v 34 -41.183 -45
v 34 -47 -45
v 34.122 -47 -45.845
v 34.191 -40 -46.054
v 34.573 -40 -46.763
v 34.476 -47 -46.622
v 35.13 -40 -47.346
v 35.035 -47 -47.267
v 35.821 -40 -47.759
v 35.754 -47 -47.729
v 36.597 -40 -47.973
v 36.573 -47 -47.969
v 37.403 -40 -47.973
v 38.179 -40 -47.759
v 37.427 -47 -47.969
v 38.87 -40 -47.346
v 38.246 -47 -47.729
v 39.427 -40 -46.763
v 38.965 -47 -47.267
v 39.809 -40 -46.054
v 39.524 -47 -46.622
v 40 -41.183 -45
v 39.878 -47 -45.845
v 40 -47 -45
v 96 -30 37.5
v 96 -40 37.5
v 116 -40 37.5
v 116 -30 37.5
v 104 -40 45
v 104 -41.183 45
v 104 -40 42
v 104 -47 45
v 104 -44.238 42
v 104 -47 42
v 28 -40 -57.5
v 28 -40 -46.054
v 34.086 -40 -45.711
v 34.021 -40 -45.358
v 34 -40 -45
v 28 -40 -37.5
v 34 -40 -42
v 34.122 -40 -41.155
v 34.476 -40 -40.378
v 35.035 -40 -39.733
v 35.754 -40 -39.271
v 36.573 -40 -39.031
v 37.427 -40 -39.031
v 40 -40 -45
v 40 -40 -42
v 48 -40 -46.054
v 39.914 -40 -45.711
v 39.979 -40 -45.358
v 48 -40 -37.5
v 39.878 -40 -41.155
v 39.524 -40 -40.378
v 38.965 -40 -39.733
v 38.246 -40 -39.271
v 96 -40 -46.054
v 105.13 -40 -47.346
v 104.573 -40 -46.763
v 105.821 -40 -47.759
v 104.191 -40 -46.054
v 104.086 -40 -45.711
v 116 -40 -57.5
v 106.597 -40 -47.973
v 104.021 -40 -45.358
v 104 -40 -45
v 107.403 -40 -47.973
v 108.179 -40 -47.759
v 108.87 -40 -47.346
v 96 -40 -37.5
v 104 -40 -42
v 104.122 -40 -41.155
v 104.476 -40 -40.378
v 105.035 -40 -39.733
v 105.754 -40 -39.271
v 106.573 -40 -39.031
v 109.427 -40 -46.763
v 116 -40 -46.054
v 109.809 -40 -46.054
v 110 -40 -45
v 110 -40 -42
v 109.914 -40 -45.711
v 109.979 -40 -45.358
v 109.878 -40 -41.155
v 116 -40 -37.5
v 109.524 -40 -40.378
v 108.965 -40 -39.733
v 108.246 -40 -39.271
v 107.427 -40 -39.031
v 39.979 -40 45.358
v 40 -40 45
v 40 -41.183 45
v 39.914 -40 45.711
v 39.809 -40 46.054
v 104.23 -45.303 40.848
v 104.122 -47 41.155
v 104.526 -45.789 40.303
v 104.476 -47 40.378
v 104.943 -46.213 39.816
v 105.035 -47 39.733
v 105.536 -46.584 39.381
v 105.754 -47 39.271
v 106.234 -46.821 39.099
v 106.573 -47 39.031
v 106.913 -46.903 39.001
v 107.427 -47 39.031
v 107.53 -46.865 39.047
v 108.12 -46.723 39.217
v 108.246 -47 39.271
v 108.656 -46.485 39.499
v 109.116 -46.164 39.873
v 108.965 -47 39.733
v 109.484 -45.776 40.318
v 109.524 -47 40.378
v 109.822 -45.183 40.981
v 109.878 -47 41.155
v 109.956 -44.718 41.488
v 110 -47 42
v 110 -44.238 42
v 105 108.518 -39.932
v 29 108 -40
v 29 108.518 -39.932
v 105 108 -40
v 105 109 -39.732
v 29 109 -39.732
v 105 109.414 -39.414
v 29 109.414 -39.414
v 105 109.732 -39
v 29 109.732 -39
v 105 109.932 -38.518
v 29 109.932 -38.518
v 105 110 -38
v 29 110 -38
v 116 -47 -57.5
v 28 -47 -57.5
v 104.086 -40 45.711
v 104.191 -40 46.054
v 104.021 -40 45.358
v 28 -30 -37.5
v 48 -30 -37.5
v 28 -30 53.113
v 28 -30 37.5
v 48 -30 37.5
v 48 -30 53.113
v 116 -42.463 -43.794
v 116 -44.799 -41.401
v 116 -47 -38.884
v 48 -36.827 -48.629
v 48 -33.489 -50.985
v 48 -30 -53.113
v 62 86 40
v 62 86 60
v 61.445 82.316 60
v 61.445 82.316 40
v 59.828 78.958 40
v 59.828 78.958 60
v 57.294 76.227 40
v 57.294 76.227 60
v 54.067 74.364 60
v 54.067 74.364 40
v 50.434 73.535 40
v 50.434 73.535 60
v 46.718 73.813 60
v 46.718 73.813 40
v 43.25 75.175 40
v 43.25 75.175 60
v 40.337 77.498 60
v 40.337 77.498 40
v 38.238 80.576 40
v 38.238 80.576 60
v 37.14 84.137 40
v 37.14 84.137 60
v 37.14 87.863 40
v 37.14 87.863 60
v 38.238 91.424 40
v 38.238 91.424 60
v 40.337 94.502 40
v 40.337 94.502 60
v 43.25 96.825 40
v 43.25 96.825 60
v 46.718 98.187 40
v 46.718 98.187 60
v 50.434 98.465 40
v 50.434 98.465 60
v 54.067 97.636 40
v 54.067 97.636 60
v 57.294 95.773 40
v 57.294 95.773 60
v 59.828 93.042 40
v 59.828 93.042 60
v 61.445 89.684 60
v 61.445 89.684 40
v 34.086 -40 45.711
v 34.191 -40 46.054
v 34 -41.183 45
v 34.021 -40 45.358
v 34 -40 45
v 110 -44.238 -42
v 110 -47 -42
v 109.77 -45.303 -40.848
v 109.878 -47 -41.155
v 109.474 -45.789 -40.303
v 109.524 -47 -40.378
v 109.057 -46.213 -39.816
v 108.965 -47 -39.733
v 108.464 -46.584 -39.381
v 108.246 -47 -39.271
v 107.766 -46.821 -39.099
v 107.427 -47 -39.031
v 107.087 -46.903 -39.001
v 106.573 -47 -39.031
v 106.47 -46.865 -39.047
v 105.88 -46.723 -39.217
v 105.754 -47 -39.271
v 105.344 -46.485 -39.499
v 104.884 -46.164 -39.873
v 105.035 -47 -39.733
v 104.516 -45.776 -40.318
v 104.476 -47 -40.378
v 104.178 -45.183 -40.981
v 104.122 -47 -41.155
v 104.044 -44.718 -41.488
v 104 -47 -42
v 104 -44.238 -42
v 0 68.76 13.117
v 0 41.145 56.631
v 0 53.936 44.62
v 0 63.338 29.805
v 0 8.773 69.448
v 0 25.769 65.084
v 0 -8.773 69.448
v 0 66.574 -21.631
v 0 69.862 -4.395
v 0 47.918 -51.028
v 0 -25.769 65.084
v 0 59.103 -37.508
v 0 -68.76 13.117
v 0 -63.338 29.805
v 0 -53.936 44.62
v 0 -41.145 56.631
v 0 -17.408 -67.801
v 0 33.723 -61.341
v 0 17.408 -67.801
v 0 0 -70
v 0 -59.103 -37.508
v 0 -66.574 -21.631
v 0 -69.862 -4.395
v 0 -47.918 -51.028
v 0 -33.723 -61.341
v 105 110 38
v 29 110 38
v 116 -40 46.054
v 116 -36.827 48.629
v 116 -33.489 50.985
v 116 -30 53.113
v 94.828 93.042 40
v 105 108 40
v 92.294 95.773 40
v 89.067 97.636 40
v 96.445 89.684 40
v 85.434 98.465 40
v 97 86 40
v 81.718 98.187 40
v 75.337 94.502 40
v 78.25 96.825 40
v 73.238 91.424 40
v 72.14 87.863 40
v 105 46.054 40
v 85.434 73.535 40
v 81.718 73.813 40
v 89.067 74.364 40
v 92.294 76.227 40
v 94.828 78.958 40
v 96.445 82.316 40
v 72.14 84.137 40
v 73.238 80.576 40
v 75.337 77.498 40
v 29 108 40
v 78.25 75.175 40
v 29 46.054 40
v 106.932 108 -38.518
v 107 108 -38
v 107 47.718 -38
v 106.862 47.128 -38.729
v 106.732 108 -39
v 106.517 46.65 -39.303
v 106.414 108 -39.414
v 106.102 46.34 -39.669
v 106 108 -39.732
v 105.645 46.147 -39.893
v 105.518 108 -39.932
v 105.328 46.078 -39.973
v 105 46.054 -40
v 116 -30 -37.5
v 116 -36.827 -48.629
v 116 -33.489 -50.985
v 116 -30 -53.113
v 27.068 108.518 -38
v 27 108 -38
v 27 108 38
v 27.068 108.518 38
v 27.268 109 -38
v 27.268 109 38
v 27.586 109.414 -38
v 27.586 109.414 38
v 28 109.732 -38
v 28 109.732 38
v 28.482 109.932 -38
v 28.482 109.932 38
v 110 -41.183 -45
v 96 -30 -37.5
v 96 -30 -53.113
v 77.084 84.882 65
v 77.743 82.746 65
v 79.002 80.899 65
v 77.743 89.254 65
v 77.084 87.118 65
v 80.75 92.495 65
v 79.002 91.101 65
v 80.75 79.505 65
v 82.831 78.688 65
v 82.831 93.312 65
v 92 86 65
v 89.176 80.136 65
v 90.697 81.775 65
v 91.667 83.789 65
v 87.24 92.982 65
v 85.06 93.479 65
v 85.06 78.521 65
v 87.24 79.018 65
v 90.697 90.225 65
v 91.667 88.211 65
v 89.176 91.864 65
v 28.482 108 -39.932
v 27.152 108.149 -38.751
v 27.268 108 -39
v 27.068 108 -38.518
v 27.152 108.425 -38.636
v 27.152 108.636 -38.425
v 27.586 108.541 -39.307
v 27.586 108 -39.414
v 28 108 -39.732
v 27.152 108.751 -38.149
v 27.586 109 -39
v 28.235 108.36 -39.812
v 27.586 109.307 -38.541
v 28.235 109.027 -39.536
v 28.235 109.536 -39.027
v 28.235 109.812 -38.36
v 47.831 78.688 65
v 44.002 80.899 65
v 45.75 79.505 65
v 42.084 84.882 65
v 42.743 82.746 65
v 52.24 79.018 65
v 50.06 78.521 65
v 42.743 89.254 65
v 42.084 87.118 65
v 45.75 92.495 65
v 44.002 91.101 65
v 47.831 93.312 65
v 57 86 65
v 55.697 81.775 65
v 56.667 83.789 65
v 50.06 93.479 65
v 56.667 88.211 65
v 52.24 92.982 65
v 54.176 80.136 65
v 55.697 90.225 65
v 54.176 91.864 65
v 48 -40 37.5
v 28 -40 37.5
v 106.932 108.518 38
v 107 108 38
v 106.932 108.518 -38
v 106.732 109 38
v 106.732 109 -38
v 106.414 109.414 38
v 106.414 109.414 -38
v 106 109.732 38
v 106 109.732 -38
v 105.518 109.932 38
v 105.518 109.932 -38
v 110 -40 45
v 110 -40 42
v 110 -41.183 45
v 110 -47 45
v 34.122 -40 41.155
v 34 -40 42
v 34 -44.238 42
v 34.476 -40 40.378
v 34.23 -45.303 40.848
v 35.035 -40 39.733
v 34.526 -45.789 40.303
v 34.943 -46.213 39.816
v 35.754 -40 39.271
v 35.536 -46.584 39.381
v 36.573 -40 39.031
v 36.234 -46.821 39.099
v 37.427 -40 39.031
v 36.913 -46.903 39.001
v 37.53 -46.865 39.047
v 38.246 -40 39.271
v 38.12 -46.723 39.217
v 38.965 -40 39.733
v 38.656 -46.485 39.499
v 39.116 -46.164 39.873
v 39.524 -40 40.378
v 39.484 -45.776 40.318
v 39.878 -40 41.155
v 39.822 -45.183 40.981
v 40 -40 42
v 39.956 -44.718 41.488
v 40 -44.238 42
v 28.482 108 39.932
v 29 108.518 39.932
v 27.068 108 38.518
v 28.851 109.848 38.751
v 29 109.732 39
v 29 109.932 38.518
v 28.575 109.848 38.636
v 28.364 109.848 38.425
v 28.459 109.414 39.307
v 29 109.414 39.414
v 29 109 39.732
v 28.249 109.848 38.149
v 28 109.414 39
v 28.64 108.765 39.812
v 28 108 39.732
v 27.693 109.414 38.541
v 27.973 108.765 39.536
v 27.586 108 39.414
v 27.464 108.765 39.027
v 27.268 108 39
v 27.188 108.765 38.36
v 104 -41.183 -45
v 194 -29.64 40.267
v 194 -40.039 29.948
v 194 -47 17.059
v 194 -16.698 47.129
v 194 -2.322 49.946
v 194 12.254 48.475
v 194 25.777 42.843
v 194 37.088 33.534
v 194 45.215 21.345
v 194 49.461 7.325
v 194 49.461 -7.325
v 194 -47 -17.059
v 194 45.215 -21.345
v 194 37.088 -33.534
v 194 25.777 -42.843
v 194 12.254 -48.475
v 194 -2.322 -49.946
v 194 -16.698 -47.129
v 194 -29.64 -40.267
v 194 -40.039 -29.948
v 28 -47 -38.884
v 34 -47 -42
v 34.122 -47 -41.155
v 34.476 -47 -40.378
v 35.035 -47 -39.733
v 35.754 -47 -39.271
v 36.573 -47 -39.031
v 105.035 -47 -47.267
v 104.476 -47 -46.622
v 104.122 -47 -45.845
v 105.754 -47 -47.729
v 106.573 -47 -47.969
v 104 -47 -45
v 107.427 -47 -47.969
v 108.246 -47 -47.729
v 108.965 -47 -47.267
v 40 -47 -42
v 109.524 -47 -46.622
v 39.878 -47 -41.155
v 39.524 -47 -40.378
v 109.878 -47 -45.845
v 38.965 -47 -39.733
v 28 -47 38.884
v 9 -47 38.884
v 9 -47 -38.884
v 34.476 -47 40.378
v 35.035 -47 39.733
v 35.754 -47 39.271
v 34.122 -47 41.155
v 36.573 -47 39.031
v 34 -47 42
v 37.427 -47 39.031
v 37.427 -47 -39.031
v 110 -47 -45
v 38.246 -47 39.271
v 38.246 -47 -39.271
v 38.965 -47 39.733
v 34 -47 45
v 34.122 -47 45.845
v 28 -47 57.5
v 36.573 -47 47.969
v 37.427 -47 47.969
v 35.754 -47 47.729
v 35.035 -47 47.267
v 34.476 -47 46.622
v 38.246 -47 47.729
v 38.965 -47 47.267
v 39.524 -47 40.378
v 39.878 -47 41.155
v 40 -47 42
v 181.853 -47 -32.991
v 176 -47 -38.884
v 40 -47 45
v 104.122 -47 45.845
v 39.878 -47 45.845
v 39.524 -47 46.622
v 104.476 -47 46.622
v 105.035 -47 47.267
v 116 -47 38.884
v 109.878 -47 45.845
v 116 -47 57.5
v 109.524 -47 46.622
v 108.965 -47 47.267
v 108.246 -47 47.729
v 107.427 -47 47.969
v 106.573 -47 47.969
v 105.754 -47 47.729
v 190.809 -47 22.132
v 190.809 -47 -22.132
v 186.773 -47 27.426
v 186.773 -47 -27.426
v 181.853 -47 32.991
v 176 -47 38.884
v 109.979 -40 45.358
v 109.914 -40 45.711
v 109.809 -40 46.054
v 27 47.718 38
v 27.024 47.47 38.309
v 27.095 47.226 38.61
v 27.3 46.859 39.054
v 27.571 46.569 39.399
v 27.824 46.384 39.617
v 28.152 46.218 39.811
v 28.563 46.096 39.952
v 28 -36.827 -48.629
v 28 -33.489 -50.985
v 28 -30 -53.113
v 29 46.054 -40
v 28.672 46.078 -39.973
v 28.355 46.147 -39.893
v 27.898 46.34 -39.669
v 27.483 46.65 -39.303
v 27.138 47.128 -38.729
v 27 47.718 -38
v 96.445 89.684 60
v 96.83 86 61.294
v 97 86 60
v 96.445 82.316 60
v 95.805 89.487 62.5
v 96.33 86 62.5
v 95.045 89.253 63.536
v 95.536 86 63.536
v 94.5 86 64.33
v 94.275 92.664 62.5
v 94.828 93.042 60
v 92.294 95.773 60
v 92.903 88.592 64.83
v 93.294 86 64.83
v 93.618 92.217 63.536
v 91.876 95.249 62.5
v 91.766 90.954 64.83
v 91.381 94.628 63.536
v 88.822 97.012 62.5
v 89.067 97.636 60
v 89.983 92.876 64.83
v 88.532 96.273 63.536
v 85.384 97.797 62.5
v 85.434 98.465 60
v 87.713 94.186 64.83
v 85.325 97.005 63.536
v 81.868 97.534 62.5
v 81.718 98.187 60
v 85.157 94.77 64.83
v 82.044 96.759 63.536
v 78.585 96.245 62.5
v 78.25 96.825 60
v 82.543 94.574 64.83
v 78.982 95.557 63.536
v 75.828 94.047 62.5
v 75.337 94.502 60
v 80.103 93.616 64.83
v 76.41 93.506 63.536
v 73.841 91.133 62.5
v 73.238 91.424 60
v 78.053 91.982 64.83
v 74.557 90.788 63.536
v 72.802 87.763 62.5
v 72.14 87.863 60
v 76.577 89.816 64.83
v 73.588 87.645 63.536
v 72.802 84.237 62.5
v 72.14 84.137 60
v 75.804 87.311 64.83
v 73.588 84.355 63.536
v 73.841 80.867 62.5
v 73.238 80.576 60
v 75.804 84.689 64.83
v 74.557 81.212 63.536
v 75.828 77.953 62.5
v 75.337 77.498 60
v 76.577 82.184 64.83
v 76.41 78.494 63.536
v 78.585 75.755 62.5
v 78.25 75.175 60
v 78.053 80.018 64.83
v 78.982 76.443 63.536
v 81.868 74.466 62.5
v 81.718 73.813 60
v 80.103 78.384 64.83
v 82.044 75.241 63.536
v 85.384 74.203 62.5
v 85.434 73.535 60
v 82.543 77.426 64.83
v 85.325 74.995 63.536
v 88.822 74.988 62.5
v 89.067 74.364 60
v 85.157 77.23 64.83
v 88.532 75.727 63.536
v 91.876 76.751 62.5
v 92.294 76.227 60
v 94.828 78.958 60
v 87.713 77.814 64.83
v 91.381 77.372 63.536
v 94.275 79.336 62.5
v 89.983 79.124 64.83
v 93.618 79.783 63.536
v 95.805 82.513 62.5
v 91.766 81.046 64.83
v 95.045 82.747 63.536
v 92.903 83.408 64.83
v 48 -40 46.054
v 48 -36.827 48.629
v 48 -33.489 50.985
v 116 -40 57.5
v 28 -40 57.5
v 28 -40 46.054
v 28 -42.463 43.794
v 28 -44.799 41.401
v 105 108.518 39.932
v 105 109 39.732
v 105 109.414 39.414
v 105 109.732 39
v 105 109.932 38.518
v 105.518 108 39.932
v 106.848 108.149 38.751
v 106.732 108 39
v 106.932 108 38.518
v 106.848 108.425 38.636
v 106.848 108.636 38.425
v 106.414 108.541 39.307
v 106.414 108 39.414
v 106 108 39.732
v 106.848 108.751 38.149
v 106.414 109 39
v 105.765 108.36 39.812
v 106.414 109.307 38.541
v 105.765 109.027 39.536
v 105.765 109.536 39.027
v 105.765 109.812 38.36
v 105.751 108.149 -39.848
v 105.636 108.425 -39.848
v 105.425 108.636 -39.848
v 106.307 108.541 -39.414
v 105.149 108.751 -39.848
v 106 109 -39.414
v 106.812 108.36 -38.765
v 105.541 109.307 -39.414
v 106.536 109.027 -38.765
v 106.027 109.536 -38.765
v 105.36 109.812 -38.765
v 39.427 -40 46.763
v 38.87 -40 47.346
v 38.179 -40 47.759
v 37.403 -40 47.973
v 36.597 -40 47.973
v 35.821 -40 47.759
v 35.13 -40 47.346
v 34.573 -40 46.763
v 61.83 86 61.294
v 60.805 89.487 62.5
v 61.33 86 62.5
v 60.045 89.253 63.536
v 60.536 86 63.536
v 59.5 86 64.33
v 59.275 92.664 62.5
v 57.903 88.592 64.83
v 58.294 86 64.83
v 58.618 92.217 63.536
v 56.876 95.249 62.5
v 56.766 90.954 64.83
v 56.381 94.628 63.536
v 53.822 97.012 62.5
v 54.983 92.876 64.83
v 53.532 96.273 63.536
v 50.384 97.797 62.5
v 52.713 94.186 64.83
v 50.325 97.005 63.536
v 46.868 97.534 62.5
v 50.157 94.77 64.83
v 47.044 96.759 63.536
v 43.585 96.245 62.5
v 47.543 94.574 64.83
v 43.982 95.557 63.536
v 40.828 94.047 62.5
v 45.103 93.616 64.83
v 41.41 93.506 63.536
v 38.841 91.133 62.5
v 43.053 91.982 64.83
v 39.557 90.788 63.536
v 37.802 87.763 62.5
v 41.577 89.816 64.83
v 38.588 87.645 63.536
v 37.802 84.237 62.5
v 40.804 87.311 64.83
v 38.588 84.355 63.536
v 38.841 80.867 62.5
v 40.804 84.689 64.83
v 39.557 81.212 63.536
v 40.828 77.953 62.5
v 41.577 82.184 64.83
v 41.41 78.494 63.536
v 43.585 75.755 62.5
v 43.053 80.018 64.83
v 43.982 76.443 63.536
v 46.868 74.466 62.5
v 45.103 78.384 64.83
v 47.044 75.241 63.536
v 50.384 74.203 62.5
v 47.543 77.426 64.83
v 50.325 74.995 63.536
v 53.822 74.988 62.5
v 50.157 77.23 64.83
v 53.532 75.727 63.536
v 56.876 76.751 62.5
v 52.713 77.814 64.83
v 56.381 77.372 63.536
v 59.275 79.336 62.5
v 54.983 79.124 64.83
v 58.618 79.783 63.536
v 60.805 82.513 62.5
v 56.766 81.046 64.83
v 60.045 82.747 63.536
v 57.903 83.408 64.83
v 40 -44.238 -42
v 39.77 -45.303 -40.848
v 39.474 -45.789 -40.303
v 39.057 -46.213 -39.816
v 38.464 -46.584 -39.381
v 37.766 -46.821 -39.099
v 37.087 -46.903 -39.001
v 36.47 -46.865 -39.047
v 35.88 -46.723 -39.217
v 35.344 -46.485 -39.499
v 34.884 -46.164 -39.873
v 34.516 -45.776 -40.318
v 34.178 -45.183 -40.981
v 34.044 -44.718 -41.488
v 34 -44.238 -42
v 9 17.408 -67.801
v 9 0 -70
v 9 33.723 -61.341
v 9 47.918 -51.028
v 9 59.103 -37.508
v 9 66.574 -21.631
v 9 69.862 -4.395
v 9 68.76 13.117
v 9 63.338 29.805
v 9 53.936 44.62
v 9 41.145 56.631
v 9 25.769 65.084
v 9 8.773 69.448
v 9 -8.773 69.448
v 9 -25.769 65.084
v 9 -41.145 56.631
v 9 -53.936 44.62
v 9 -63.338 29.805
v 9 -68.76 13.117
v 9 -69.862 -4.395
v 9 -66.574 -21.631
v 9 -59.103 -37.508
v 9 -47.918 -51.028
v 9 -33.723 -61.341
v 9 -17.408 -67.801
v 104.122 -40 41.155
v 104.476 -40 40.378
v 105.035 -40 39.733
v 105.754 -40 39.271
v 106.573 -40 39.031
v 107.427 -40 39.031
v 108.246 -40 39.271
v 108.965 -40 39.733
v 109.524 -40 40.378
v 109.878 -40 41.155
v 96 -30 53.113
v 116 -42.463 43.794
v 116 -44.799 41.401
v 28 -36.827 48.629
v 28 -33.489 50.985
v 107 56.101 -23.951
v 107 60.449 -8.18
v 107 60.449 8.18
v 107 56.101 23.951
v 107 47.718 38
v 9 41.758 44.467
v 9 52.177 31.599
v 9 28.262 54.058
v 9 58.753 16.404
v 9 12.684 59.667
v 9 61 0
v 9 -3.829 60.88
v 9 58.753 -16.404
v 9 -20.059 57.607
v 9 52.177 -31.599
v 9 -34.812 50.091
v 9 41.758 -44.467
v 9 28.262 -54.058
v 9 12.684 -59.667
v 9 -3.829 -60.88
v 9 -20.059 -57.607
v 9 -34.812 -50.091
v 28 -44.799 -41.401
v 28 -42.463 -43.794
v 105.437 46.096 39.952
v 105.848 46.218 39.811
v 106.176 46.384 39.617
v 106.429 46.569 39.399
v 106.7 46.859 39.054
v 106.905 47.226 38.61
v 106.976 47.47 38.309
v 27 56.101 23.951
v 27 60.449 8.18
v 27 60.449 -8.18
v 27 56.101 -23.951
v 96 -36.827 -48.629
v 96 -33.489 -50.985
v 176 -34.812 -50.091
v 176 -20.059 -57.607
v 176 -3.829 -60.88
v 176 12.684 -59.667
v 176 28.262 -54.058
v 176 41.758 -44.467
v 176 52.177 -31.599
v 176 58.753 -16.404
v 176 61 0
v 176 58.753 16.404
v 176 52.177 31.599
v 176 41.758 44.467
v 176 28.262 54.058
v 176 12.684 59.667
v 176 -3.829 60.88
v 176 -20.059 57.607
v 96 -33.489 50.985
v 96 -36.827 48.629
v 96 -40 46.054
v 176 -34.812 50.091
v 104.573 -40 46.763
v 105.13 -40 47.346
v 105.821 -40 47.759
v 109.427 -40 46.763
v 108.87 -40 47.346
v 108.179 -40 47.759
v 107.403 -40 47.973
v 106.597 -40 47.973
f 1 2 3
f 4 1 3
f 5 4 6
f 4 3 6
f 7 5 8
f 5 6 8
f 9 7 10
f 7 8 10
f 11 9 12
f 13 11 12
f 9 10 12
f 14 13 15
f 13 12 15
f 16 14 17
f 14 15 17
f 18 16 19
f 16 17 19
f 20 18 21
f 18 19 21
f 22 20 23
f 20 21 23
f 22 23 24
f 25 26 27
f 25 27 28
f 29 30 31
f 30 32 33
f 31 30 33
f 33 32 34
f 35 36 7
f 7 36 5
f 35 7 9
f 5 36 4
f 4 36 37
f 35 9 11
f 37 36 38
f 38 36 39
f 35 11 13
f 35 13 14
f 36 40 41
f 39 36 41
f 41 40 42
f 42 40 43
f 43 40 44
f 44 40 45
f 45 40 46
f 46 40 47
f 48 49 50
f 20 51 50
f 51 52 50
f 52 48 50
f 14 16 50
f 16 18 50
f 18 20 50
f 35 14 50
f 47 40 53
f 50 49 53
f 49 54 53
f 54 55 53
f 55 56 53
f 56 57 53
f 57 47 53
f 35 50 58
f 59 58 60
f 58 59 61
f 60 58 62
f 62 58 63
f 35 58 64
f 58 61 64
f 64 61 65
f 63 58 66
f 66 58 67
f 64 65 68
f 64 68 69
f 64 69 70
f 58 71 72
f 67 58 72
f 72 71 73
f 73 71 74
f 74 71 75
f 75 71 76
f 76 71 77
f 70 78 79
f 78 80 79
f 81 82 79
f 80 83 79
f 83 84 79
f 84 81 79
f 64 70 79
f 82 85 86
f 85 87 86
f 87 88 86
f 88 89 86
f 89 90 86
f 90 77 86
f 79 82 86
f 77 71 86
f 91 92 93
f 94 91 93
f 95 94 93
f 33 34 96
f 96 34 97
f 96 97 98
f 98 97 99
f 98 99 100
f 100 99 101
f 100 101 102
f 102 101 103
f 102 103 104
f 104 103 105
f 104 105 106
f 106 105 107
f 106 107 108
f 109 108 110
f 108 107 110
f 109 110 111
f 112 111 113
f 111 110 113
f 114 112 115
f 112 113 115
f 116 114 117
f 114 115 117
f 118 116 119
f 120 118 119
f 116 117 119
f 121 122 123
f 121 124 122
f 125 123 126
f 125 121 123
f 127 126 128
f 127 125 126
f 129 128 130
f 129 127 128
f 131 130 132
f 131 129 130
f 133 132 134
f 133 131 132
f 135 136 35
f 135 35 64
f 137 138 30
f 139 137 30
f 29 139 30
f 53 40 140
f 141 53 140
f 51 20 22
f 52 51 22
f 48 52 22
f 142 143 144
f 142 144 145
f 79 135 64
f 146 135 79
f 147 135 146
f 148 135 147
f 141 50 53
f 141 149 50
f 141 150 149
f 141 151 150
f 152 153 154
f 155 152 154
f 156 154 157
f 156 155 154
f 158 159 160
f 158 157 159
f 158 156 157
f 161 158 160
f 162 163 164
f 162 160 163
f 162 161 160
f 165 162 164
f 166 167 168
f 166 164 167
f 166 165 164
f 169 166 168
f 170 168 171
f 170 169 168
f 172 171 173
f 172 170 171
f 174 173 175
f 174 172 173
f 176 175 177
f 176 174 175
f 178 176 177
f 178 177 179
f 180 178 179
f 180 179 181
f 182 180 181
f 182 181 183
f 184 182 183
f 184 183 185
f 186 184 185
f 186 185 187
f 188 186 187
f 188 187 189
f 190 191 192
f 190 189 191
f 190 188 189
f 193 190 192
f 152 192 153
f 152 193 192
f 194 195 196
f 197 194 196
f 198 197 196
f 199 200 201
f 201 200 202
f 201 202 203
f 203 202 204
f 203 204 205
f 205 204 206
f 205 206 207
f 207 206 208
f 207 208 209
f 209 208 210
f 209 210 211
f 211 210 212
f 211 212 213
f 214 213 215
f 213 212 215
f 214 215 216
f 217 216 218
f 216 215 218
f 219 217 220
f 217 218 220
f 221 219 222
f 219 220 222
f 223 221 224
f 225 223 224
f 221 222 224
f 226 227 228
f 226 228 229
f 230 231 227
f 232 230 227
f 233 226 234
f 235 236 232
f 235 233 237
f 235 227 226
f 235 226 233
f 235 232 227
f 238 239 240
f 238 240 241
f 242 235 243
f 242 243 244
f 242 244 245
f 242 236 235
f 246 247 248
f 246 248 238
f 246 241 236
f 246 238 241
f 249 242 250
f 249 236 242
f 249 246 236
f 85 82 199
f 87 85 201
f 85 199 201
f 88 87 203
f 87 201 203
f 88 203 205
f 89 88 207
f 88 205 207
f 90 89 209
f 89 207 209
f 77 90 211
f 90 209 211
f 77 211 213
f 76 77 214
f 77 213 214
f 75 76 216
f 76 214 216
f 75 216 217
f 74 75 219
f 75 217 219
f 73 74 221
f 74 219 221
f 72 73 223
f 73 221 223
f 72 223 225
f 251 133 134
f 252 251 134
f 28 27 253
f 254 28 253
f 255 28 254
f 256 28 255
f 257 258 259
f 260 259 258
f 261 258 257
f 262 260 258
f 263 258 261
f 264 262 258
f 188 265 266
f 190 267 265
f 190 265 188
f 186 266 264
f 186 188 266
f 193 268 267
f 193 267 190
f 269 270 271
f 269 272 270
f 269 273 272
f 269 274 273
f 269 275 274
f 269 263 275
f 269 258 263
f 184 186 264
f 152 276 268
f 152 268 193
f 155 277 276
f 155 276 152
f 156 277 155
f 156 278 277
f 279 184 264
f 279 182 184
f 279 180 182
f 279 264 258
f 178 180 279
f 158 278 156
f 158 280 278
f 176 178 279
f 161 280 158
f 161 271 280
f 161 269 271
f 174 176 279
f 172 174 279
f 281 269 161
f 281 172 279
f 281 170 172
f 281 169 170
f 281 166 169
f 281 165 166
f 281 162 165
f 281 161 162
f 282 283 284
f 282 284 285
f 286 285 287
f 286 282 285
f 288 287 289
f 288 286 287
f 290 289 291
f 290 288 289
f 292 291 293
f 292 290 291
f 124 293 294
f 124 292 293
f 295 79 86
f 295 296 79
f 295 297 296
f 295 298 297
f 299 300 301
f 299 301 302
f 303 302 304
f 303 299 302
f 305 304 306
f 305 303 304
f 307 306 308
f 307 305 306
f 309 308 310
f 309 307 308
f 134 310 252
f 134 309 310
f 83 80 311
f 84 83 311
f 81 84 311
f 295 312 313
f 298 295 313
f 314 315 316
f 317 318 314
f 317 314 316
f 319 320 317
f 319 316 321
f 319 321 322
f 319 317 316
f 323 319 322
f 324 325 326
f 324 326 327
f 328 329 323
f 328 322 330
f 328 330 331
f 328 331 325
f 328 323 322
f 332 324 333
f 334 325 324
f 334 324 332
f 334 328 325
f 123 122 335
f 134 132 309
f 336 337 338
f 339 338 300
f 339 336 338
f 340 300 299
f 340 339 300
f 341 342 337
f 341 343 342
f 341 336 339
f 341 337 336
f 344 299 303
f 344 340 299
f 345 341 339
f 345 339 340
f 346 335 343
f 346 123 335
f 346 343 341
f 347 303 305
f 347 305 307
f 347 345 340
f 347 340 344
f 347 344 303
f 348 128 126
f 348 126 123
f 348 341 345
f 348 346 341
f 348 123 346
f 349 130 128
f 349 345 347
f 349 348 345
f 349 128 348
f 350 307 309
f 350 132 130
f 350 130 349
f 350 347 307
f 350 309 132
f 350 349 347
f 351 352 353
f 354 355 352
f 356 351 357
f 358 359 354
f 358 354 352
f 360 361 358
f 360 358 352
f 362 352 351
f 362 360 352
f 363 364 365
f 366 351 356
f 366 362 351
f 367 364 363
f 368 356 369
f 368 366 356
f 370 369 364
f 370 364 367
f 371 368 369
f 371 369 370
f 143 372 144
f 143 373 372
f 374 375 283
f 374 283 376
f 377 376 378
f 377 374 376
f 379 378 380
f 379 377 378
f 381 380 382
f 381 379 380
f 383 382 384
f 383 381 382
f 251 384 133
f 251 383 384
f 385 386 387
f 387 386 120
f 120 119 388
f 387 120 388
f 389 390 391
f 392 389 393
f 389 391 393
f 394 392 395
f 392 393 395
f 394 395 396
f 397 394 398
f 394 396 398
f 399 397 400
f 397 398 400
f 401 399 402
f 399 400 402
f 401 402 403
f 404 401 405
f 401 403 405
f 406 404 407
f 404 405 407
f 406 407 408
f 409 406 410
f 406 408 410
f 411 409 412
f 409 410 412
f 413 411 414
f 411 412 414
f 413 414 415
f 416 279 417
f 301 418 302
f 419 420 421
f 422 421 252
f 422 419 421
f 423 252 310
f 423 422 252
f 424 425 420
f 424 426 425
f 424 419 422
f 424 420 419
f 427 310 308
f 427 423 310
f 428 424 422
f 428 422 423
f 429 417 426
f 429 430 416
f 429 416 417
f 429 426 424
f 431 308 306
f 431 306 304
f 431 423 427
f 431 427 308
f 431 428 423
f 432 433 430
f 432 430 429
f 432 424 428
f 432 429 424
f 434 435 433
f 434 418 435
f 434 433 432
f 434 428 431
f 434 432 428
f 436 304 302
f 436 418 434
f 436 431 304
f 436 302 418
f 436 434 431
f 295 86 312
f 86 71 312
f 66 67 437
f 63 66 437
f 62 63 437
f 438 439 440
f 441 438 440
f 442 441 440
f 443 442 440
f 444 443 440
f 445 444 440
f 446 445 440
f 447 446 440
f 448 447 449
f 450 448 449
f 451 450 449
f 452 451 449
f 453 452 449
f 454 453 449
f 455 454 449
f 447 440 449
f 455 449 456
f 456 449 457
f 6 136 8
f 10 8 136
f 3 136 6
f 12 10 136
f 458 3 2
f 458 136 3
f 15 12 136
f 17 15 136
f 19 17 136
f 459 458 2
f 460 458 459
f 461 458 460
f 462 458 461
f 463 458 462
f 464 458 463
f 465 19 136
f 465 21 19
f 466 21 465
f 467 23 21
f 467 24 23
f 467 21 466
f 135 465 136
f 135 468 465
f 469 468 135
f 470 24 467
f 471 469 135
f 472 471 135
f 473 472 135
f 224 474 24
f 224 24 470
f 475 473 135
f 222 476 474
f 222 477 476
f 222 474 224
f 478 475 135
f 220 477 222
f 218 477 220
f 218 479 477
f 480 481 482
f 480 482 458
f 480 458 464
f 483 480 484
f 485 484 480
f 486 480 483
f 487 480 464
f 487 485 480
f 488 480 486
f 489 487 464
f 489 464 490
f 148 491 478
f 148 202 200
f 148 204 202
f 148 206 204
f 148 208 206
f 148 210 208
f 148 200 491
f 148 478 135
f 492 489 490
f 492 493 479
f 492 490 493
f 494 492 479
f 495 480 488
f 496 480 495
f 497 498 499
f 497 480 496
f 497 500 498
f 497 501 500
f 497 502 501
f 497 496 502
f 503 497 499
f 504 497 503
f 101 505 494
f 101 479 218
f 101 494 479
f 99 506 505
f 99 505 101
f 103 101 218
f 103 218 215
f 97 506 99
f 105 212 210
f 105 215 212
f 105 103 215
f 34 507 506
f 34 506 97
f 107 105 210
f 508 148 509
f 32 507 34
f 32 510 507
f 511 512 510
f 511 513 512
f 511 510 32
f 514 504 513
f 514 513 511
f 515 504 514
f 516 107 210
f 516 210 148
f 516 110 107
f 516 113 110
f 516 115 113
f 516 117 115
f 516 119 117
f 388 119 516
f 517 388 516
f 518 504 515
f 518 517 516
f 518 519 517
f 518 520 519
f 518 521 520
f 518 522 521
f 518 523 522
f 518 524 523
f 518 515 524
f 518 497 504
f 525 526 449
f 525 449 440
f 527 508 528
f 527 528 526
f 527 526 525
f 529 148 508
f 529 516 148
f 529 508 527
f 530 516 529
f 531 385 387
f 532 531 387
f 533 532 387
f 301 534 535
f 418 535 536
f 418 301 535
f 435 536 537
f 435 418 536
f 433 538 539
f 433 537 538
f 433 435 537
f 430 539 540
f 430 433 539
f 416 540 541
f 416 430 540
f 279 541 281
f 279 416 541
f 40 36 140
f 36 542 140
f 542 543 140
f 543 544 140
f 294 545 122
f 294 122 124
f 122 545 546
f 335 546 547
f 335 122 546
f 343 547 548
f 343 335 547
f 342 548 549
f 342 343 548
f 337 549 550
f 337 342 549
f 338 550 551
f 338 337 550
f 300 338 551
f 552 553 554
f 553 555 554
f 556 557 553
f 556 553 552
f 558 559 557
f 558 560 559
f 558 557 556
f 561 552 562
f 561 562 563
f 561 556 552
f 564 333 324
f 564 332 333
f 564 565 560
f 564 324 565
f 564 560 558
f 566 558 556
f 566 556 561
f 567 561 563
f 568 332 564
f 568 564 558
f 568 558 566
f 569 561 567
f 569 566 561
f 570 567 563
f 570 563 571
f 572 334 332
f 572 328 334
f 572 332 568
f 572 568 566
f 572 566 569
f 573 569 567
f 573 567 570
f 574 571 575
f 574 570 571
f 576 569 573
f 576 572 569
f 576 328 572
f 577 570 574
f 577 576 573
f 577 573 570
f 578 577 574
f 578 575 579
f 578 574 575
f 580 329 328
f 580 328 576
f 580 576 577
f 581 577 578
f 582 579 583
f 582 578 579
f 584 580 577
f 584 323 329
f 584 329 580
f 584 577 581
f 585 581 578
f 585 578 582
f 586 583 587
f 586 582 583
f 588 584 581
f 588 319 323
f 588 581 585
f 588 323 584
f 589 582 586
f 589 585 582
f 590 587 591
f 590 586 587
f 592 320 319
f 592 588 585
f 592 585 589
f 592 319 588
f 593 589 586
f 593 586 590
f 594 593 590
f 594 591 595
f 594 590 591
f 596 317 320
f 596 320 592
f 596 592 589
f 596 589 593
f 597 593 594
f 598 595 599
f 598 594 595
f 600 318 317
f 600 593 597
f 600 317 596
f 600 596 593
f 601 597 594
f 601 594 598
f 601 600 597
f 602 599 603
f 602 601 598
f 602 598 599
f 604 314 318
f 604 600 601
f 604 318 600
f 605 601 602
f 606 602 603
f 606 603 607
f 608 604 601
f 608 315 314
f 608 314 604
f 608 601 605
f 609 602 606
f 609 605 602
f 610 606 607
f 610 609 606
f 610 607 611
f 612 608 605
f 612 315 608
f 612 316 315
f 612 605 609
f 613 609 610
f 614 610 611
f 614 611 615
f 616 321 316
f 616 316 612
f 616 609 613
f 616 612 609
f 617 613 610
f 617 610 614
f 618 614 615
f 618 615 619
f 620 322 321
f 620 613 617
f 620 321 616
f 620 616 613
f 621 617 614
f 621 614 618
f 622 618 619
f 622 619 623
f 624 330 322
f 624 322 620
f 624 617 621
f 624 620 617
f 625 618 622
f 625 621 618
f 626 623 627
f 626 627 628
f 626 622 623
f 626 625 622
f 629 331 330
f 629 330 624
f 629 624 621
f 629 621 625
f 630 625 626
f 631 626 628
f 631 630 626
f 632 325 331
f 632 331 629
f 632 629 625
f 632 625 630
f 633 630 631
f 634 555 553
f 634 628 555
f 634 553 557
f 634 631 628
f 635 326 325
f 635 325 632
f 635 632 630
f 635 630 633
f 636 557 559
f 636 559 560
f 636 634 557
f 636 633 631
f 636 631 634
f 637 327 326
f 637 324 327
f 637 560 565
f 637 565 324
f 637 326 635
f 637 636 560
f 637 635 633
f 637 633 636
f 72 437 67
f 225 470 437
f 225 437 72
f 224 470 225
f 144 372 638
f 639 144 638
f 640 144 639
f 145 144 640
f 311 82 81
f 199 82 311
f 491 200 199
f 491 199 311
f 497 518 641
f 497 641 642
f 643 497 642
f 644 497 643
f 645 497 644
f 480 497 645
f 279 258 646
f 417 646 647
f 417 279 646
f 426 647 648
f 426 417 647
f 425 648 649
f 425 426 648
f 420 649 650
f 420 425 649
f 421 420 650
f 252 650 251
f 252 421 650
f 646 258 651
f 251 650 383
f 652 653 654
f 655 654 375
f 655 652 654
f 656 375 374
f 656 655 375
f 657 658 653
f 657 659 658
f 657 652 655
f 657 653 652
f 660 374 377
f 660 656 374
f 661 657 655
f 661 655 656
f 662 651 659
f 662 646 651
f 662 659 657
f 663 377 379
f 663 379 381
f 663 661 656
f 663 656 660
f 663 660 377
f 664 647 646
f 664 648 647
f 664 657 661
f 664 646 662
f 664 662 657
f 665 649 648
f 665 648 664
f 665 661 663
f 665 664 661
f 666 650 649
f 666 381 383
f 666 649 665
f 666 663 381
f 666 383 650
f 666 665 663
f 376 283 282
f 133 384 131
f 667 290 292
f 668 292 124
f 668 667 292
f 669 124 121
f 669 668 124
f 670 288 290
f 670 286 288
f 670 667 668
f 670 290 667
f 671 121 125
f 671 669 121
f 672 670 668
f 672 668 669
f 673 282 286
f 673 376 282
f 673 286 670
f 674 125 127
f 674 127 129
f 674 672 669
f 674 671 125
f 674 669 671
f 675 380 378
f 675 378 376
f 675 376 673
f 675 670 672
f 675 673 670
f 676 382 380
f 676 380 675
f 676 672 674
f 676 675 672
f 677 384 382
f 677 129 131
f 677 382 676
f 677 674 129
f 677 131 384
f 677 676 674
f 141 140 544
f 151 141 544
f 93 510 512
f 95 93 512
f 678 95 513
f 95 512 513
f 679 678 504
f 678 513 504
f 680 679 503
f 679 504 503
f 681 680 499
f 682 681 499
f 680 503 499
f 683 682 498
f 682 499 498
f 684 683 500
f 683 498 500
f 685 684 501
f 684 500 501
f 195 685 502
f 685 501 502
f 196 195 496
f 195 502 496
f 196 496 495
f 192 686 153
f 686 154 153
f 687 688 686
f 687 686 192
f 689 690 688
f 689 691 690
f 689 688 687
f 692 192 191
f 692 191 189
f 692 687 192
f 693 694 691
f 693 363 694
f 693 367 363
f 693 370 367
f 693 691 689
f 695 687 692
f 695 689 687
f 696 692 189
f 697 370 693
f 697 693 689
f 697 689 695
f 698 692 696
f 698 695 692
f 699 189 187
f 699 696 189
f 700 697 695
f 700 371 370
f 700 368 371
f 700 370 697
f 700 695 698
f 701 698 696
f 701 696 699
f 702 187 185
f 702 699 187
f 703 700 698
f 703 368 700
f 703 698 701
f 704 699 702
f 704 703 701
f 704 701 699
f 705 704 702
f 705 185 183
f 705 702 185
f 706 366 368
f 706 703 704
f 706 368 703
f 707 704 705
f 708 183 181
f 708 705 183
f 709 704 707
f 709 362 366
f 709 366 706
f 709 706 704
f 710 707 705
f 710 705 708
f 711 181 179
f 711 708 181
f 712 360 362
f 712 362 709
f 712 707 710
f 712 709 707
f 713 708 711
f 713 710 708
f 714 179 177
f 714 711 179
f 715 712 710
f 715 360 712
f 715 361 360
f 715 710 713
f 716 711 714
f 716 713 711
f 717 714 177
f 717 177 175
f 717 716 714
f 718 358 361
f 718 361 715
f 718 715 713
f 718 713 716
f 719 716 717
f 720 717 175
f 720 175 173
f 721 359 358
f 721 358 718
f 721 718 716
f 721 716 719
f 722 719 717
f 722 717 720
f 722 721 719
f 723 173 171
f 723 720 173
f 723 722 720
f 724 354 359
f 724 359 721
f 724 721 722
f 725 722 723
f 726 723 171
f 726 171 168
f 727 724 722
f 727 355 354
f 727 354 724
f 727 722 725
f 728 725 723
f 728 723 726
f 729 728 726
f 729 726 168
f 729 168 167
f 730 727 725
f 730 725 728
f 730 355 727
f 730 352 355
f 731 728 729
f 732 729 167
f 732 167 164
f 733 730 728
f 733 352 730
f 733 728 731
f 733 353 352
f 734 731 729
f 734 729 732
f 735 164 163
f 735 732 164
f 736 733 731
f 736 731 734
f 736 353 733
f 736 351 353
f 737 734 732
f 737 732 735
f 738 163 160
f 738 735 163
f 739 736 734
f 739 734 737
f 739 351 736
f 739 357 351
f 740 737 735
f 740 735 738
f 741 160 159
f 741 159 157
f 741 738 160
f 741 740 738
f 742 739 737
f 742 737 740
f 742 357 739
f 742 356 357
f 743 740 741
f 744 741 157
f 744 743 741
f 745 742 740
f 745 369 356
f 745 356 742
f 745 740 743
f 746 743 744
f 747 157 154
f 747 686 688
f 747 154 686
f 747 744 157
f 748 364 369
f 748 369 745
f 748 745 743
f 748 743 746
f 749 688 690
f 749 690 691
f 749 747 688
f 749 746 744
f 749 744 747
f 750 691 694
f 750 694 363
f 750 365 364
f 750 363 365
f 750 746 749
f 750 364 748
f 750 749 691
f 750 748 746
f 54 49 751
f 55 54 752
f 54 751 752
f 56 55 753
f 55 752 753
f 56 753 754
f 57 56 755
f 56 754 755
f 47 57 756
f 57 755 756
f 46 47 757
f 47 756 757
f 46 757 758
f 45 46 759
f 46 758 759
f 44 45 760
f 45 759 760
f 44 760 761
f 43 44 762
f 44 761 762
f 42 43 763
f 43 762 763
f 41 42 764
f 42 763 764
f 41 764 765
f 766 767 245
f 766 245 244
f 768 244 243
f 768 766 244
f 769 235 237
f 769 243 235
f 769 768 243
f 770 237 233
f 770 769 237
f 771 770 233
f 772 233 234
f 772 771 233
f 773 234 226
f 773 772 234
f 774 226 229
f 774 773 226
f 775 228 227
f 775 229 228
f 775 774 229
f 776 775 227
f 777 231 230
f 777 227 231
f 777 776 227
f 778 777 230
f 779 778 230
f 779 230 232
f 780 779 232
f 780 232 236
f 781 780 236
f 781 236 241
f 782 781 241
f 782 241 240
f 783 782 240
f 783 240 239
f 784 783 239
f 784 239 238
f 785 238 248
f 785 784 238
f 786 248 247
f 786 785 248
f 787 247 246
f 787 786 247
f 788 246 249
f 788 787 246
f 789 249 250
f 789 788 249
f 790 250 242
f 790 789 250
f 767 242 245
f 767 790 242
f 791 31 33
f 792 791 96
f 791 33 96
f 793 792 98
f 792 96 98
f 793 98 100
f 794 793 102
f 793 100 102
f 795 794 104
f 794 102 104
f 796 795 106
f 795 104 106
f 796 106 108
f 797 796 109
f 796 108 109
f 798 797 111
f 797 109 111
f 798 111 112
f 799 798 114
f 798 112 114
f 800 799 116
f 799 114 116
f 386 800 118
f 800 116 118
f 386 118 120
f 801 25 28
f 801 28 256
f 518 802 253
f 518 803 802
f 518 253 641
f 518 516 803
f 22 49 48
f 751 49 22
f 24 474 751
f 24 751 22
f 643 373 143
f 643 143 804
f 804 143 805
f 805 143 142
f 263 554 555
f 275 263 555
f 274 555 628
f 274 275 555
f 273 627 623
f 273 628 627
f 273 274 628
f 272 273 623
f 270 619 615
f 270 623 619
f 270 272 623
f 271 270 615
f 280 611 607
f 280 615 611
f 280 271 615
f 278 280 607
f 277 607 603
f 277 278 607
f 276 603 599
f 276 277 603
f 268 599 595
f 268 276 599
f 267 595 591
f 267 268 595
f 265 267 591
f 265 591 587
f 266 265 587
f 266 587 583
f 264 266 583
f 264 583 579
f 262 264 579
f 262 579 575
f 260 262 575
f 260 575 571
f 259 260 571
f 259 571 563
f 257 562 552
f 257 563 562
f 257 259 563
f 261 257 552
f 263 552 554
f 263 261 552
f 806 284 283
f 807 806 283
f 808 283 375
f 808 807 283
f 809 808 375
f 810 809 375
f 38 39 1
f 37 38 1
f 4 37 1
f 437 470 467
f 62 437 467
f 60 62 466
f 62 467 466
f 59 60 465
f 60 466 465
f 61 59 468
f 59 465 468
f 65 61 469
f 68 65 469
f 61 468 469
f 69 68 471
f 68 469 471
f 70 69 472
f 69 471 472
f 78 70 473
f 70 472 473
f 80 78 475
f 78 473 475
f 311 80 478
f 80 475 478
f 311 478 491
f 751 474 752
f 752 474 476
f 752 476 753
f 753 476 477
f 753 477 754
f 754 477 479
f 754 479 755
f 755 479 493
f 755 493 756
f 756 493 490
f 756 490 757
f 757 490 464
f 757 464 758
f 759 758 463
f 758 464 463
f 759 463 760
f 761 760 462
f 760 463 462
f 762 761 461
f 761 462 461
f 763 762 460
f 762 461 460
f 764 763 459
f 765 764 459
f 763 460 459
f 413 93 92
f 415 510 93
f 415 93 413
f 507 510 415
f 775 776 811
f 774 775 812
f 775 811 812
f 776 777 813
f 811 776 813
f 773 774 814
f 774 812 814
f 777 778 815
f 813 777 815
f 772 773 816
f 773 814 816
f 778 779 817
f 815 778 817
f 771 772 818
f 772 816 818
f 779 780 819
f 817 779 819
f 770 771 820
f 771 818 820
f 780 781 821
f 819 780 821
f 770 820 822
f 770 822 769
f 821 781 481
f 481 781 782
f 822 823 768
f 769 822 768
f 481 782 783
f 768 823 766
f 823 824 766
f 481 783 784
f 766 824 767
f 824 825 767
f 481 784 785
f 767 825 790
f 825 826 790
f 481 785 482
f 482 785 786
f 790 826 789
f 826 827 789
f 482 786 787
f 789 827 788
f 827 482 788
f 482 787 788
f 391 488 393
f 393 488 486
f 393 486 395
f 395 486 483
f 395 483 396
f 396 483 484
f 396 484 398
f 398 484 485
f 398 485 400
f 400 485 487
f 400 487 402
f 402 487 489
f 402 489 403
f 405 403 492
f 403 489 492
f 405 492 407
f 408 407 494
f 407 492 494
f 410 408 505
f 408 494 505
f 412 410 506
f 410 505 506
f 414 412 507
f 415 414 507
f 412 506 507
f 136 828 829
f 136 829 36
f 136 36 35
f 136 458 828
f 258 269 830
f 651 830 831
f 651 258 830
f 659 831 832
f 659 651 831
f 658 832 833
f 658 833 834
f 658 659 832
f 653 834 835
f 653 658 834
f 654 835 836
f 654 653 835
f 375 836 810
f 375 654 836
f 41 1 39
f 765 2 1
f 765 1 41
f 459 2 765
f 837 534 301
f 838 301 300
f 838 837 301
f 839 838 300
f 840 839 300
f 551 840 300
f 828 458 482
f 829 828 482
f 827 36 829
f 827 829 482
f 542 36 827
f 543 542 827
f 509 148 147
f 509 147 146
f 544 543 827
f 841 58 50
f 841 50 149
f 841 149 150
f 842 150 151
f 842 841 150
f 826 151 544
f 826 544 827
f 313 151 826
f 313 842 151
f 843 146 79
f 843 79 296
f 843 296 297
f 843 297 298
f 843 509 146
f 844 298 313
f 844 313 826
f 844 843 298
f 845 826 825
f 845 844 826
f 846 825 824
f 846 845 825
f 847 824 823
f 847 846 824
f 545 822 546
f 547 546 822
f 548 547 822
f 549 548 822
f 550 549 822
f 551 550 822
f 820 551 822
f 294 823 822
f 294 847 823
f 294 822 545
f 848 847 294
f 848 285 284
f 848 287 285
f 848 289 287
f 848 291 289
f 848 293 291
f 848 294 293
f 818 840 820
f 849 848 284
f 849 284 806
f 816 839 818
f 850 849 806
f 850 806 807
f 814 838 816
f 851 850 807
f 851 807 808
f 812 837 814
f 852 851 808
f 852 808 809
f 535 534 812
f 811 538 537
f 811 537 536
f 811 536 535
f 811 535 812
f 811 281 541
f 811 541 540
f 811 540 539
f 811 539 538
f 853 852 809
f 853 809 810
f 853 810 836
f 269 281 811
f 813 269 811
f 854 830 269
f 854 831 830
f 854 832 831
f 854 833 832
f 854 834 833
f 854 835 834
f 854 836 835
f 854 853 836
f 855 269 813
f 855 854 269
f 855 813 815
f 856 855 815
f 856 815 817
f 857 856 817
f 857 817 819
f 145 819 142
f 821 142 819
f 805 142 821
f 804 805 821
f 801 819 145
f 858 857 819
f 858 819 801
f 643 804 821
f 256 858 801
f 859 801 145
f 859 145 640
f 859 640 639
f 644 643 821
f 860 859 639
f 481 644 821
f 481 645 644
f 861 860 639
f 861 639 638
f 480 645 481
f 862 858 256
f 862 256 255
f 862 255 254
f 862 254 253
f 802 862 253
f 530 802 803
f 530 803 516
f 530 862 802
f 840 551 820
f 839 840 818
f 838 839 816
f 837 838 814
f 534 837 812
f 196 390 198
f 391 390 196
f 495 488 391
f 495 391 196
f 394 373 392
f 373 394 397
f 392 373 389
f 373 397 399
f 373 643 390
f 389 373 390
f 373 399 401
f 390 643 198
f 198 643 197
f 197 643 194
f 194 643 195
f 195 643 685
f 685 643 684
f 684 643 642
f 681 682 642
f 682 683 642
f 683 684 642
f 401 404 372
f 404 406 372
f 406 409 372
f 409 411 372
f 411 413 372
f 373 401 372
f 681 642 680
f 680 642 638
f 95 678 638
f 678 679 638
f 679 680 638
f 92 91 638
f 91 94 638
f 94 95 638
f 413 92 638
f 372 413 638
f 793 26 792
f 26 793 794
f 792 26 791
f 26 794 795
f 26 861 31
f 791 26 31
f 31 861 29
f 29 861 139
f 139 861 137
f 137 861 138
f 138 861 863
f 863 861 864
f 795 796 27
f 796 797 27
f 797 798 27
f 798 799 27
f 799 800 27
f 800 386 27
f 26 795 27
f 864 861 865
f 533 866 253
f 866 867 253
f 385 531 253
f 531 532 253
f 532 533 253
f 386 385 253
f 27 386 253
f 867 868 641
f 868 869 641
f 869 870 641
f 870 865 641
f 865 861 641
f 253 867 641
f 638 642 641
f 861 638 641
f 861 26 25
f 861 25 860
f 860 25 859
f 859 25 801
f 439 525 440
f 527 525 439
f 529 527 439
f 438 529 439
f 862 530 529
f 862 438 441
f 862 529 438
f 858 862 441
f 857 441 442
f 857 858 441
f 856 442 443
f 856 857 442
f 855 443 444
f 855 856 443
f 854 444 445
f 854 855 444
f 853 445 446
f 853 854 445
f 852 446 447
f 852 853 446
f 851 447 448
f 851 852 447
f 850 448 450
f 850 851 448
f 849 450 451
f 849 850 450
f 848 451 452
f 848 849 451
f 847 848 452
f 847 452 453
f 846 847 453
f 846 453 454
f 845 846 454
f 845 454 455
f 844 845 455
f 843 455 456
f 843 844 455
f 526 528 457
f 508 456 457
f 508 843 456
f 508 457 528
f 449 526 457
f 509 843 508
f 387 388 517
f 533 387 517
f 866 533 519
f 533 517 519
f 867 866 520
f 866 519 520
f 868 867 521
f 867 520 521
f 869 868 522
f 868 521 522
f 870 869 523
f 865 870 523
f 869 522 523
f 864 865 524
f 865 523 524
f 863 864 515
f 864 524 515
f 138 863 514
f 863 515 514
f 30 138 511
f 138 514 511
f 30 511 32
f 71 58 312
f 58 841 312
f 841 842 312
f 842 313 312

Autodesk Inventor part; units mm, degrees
ref_plane "YZ Plane" through (0, 0, 0) normal (1, 0, 0) x (0, 1, 0)
ref_plane "XZ Plane" through (0, 0, 0) normal (0, 1, 0) x (-1, 0, 0)
ref_plane "XY Plane" through (0, 0, 0) normal (0, 0, 1) x (1, 0, 0)
sketch "Эскиз1" plane through (0, 0, 0) normal (0, 1, 0) x (-1, 0, 0)
  line L0 (0, 0) -> (0, -70)
  line L1 (0, -70) -> (-9, -70)
  line L2 (-9, -70) -> (-9, -61)
  line L3 (-9, -61) -> (-176, -61)
  line L4 (-176, -61) -> (-194, -50)
  line L5 (-194, -50) -> (-194, 0)
  line L6 (-194, 0) -> (0, 0)
  point P0 (-4.5, -70)
  dimension "d0" = 194
  dimension "d1" = 9
  dimension "d14" = 140
  dimension "d103" = 122
  dimension "d104" = 100
  dimension "d105" = 18
revolve "Вращение1" add sketch "Эскиз1" angle 360 about axis through (194, 0, 0) along (-1, 0, 0)
sketch "Эскиз5" plane through (0, 0, 0) normal (0, 1, 0) x (-1, 0, 0)
  line L0 (-176, -61) -> (-176, 61) projected
  line L1 (-9, -61) -> (-9, 61) projected
  line L2 (-27, -40) -> (-107, -40)
  line L3 (-107, -40) -> (-107, 40)
  line L4 (-107, 40) -> (-27, 40)
  line L5 (-27, 40) -> (-27, -40)
  point P0 (0, 0)
  point P1 (-27, 0)
  point P2 (-9, 0)
  dimension "d38" = 80
  dimension "d40" = 18
extrude "Выдавливание4" add sketch "Эскиз5" along normal blind 110
sketch "Sketch15" plane through (27, 46.0543, 40) normal (0, 0, 1) x (1, 0, 0)
  circle A0 centre (22.5, 39.9457) radius 12.5
  circle A1 centre (57.5, 39.9457) radius 12.5
  line L0 (80, 63.9457) -> (0, 63.9457) construction
  line L1 (40, 63.9457) -> (40, 0) construction
  line L2 (0, 0) -> (80, 0) construction
  point P0 (-27, -46.0543)
  dimension "d106" = 25
  dimension "d107" = 35
  dimension "d108" = 24
extrude "Extrusion14" add sketch "Sketch15" along normal blind 25
fillet "Fillet1" radius 5 2 edges at (37, 86, 65) (72, 86, 65)
fillet "Fillet2" radius 2 8 edges at (27, 78.0272, 40) (67, 110, 40) (107, 78.0272, 40) (107, 110, 0) (67, 110, -40) (27, 110, 0) (107, 78.0272, -40) (27, 78.0272, -40)
sketch "Sketch16" plane through (9, 0, 0) normal (1, 0, 0) x (0, 0, -1)
  circle A0 centre (0, 0) radius 61 projected
  line L0 (-38.8844, -47) -> (38.8844, -47)
  line L1 (0, -61) -> (0, -47) construction
  dimension "d113" = 14
extrude "Extrusion15" cut sketch "Sketch16" along normal up to surface (185 mm away) contours L0 A0 picked at (-10.0748, -48.9953)
sketch "Sketch17" plane through (9, -47, -38.8844) normal (0, -1, 0) x (1, 0, 0)
  line L0 (0, 77.7689) -> (167, 77.7689) construction
  line L1 (0, 0) -> (0, 77.7689) construction
  line L2 (167, 0) -> (0, 0) construction
  line L3 (185, 55.9432) -> (185, 21.8257) construction
  line L4 (19, -18.6156) -> (107, -18.6156)
  line L5 (107, -18.6156) -> (107, 96.3844)
  line L6 (107, 96.3844) -> (19, 96.3844)
  line L7 (19, 96.3844) -> (19, -18.6156)
  line L8 (19, -18.6156) -> (107, 96.3844) construction
  line L9 (107, -18.6156) -> (19, 96.3844) construction
  line L10 (28, 80.8844) -> (28, 83.8844) construction
  line L11 (25, 80.8844) -> (25, 83.8844)
  line L12 (31, 83.8844) -> (31, 80.8844)
  arc A0 (25, 80.8844) -> (31, 80.8844) centre (28, 80.8844) ccw
  arc A1 (31, 83.8844) -> (25, 83.8844) centre (28, 83.8844) ccw
  line L13 (98, 80.8844) -> (98, 83.8844) construction
  line L14 (101, 80.8844) -> (101, 83.8844)
  line L15 (95, 83.8844) -> (95, 80.8844)
  arc A2 (95, 80.8844) -> (101, 80.8844) centre (98, 80.8844) ccw
  arc A3 (101, 83.8844) -> (95, 83.8844) centre (98, 83.8844) ccw
  line L16 (98, -6.1156) -> (98, -3.1156) construction
  line L17 (101, -6.1156) -> (101, -3.1156)
  line L18 (95, -3.1156) -> (95, -6.1156)
  arc A4 (95, -6.1156) -> (101, -6.1156) centre (98, -6.1156) ccw
  arc A5 (101, -3.1156) -> (95, -3.1156) centre (98, -3.1156) ccw
  line L19 (28, -6.1156) -> (28, -3.1156) construction
  line L20 (31, -6.1156) -> (31, -3.1156)
  line L21 (25, -3.1156) -> (25, -6.1156)
  arc A6 (25, -6.1156) -> (31, -6.1156) centre (28, -6.1156) ccw
  arc A7 (31, -3.1156) -> (25, -3.1156) centre (28, -3.1156) ccw
  line L22 (-9, 108.8844) -> (-9, -31.1156) projected
  line L23 (63, 38.8844) -> (-9, 38.8844) construction
  point P0 (28, 82.3844)
  point P1 (98, 82.3844)
  point P2 (98, -4.6156)
  point P3 (28, -4.6156)
  dimension "d116" = 115
  dimension "d117" = 88
  dimension "d118" = 37
  dimension "d119" = 70
  dimension "d120" = 28
  dimension "d121" = 3
  dimension "d122" = 3
  dimension "d123" = 14
extrude "Extrusion16" add sketch "Sketch17" against normal blind 7
sketch "Sketch18" plane through (28, -47, 38.8844) normal (-1, 0, 0) x (0, 0, 1)
  line L0 (18.6156, 0) -> (18.6156, 7) projected
  line L1 (-96.3844, 0) -> (-96.3844, 7) projected
  line L2 (-96.3844, 7) -> (18.6156, 7)
  line L3 (-84.9388, 7) -> (-96.3844, 7) projected
  line L4 (18.6156, 7) -> (-1.3844, 7)
  line L5 (-1.3844, 7) -> (-1.3844, 17)
  line L6 (-1.3844, 17) -> (18.6156, 17)
  line L7 (18.6156, 17) -> (18.6156, 7)
  line L8 (-96.3844, 7) -> (-76.3844, 7)
  line L9 (-76.3844, 7) -> (-76.3844, 17)
  line L10 (-76.3844, 17) -> (-96.3844, 17)
  line L11 (-96.3844, 17) -> (-96.3844, 7)
  point P0 (-38.8844, 47)
  point P1 (-76.3844, 7)
  point P2 (-1.3844, 7)
  dimension "d126" = 20
  dimension "d127" = 10
extrude "Extrusion17" cut sketch "Sketch18" against normal blind 20
pattern_linear "Rectangular Pattern2" count 2 spacing 68 along (1, 0, 0) of "Extrusion17"
sketch "Sketch19" plane through (9, -47, -38.8844) normal (0, -1, 0) x (1, 0, 0)
  arc A0 (95, -6.1156) -> (101, -6.1156) centre (98, -6.1156) ccw projected
  line L0 (95, -6.1156) -> (95, -3.1156) projected
  arc A1 (101, -3.1156) -> (95, -3.1156) centre (98, -3.1156) ccw projected
  line L1 (101, -3.1156) -> (101, -6.1156) projected
  arc A2 (25, -6.1156) -> (31, -6.1156) centre (28, -6.1156) ccw projected
  line L2 (25, -6.1156) -> (25, -3.1156) projected
  arc A3 (31, -3.1156) -> (25, -3.1156) centre (28, -3.1156) ccw projected
  line L3 (31, -3.1156) -> (31, -6.1156) projected
  arc A4 (95, 80.8844) -> (101, 80.8844) centre (98, 80.8844) ccw projected
  line L4 (95, 80.8844) -> (95, 83.8844) projected
  arc A5 (101, 83.8844) -> (95, 83.8844) centre (98, 83.8844) ccw projected
  line L5 (101, 83.8844) -> (101, 80.8844) projected
  line L6 (31, 83.8844) -> (31, 80.8844) projected
  arc A6 (25, 80.8844) -> (31, 80.8844) centre (28, 80.8844) ccw projected
  line L7 (25, 80.8844) -> (25, 83.8844) projected
  arc A7 (31, 83.8844) -> (25, 83.8844) centre (28, 83.8844) ccw projected
  line L8 (0, 77.7689) -> (19, 77.7689) projected
  line L9 (0, 0) -> (0, 77.7689) projected
  line L10 (19, 0) -> (0, 0) projected
  line L11 (19, 0) -> (19, -18.6156) projected
  line L12 (19, -18.6156) -> (107, -18.6156) projected
  line L13 (107, -18.6156) -> (107, 0) projected
  line L14 (167, 0) -> (107, 0) projected
  line L15 (185, 55.9432) -> (185, 21.8257) projected
  line L16 (107, 77.7689) -> (167, 77.7689) projected
  line L17 (107, 77.7689) -> (107, 96.3844) projected
  line L18 (107, 96.3844) -> (19, 96.3844) projected
  line L19 (19, 96.3844) -> (19, 77.7689) projected
  point P0 (-9, 38.8844)
extrude "Extrusion18" cut sketch "Sketch19" against normal blind 10
equation "\"Reductor_angle\" = 180deg"
properties part number "СДР 060 Мотор-редуктор 2.0"
